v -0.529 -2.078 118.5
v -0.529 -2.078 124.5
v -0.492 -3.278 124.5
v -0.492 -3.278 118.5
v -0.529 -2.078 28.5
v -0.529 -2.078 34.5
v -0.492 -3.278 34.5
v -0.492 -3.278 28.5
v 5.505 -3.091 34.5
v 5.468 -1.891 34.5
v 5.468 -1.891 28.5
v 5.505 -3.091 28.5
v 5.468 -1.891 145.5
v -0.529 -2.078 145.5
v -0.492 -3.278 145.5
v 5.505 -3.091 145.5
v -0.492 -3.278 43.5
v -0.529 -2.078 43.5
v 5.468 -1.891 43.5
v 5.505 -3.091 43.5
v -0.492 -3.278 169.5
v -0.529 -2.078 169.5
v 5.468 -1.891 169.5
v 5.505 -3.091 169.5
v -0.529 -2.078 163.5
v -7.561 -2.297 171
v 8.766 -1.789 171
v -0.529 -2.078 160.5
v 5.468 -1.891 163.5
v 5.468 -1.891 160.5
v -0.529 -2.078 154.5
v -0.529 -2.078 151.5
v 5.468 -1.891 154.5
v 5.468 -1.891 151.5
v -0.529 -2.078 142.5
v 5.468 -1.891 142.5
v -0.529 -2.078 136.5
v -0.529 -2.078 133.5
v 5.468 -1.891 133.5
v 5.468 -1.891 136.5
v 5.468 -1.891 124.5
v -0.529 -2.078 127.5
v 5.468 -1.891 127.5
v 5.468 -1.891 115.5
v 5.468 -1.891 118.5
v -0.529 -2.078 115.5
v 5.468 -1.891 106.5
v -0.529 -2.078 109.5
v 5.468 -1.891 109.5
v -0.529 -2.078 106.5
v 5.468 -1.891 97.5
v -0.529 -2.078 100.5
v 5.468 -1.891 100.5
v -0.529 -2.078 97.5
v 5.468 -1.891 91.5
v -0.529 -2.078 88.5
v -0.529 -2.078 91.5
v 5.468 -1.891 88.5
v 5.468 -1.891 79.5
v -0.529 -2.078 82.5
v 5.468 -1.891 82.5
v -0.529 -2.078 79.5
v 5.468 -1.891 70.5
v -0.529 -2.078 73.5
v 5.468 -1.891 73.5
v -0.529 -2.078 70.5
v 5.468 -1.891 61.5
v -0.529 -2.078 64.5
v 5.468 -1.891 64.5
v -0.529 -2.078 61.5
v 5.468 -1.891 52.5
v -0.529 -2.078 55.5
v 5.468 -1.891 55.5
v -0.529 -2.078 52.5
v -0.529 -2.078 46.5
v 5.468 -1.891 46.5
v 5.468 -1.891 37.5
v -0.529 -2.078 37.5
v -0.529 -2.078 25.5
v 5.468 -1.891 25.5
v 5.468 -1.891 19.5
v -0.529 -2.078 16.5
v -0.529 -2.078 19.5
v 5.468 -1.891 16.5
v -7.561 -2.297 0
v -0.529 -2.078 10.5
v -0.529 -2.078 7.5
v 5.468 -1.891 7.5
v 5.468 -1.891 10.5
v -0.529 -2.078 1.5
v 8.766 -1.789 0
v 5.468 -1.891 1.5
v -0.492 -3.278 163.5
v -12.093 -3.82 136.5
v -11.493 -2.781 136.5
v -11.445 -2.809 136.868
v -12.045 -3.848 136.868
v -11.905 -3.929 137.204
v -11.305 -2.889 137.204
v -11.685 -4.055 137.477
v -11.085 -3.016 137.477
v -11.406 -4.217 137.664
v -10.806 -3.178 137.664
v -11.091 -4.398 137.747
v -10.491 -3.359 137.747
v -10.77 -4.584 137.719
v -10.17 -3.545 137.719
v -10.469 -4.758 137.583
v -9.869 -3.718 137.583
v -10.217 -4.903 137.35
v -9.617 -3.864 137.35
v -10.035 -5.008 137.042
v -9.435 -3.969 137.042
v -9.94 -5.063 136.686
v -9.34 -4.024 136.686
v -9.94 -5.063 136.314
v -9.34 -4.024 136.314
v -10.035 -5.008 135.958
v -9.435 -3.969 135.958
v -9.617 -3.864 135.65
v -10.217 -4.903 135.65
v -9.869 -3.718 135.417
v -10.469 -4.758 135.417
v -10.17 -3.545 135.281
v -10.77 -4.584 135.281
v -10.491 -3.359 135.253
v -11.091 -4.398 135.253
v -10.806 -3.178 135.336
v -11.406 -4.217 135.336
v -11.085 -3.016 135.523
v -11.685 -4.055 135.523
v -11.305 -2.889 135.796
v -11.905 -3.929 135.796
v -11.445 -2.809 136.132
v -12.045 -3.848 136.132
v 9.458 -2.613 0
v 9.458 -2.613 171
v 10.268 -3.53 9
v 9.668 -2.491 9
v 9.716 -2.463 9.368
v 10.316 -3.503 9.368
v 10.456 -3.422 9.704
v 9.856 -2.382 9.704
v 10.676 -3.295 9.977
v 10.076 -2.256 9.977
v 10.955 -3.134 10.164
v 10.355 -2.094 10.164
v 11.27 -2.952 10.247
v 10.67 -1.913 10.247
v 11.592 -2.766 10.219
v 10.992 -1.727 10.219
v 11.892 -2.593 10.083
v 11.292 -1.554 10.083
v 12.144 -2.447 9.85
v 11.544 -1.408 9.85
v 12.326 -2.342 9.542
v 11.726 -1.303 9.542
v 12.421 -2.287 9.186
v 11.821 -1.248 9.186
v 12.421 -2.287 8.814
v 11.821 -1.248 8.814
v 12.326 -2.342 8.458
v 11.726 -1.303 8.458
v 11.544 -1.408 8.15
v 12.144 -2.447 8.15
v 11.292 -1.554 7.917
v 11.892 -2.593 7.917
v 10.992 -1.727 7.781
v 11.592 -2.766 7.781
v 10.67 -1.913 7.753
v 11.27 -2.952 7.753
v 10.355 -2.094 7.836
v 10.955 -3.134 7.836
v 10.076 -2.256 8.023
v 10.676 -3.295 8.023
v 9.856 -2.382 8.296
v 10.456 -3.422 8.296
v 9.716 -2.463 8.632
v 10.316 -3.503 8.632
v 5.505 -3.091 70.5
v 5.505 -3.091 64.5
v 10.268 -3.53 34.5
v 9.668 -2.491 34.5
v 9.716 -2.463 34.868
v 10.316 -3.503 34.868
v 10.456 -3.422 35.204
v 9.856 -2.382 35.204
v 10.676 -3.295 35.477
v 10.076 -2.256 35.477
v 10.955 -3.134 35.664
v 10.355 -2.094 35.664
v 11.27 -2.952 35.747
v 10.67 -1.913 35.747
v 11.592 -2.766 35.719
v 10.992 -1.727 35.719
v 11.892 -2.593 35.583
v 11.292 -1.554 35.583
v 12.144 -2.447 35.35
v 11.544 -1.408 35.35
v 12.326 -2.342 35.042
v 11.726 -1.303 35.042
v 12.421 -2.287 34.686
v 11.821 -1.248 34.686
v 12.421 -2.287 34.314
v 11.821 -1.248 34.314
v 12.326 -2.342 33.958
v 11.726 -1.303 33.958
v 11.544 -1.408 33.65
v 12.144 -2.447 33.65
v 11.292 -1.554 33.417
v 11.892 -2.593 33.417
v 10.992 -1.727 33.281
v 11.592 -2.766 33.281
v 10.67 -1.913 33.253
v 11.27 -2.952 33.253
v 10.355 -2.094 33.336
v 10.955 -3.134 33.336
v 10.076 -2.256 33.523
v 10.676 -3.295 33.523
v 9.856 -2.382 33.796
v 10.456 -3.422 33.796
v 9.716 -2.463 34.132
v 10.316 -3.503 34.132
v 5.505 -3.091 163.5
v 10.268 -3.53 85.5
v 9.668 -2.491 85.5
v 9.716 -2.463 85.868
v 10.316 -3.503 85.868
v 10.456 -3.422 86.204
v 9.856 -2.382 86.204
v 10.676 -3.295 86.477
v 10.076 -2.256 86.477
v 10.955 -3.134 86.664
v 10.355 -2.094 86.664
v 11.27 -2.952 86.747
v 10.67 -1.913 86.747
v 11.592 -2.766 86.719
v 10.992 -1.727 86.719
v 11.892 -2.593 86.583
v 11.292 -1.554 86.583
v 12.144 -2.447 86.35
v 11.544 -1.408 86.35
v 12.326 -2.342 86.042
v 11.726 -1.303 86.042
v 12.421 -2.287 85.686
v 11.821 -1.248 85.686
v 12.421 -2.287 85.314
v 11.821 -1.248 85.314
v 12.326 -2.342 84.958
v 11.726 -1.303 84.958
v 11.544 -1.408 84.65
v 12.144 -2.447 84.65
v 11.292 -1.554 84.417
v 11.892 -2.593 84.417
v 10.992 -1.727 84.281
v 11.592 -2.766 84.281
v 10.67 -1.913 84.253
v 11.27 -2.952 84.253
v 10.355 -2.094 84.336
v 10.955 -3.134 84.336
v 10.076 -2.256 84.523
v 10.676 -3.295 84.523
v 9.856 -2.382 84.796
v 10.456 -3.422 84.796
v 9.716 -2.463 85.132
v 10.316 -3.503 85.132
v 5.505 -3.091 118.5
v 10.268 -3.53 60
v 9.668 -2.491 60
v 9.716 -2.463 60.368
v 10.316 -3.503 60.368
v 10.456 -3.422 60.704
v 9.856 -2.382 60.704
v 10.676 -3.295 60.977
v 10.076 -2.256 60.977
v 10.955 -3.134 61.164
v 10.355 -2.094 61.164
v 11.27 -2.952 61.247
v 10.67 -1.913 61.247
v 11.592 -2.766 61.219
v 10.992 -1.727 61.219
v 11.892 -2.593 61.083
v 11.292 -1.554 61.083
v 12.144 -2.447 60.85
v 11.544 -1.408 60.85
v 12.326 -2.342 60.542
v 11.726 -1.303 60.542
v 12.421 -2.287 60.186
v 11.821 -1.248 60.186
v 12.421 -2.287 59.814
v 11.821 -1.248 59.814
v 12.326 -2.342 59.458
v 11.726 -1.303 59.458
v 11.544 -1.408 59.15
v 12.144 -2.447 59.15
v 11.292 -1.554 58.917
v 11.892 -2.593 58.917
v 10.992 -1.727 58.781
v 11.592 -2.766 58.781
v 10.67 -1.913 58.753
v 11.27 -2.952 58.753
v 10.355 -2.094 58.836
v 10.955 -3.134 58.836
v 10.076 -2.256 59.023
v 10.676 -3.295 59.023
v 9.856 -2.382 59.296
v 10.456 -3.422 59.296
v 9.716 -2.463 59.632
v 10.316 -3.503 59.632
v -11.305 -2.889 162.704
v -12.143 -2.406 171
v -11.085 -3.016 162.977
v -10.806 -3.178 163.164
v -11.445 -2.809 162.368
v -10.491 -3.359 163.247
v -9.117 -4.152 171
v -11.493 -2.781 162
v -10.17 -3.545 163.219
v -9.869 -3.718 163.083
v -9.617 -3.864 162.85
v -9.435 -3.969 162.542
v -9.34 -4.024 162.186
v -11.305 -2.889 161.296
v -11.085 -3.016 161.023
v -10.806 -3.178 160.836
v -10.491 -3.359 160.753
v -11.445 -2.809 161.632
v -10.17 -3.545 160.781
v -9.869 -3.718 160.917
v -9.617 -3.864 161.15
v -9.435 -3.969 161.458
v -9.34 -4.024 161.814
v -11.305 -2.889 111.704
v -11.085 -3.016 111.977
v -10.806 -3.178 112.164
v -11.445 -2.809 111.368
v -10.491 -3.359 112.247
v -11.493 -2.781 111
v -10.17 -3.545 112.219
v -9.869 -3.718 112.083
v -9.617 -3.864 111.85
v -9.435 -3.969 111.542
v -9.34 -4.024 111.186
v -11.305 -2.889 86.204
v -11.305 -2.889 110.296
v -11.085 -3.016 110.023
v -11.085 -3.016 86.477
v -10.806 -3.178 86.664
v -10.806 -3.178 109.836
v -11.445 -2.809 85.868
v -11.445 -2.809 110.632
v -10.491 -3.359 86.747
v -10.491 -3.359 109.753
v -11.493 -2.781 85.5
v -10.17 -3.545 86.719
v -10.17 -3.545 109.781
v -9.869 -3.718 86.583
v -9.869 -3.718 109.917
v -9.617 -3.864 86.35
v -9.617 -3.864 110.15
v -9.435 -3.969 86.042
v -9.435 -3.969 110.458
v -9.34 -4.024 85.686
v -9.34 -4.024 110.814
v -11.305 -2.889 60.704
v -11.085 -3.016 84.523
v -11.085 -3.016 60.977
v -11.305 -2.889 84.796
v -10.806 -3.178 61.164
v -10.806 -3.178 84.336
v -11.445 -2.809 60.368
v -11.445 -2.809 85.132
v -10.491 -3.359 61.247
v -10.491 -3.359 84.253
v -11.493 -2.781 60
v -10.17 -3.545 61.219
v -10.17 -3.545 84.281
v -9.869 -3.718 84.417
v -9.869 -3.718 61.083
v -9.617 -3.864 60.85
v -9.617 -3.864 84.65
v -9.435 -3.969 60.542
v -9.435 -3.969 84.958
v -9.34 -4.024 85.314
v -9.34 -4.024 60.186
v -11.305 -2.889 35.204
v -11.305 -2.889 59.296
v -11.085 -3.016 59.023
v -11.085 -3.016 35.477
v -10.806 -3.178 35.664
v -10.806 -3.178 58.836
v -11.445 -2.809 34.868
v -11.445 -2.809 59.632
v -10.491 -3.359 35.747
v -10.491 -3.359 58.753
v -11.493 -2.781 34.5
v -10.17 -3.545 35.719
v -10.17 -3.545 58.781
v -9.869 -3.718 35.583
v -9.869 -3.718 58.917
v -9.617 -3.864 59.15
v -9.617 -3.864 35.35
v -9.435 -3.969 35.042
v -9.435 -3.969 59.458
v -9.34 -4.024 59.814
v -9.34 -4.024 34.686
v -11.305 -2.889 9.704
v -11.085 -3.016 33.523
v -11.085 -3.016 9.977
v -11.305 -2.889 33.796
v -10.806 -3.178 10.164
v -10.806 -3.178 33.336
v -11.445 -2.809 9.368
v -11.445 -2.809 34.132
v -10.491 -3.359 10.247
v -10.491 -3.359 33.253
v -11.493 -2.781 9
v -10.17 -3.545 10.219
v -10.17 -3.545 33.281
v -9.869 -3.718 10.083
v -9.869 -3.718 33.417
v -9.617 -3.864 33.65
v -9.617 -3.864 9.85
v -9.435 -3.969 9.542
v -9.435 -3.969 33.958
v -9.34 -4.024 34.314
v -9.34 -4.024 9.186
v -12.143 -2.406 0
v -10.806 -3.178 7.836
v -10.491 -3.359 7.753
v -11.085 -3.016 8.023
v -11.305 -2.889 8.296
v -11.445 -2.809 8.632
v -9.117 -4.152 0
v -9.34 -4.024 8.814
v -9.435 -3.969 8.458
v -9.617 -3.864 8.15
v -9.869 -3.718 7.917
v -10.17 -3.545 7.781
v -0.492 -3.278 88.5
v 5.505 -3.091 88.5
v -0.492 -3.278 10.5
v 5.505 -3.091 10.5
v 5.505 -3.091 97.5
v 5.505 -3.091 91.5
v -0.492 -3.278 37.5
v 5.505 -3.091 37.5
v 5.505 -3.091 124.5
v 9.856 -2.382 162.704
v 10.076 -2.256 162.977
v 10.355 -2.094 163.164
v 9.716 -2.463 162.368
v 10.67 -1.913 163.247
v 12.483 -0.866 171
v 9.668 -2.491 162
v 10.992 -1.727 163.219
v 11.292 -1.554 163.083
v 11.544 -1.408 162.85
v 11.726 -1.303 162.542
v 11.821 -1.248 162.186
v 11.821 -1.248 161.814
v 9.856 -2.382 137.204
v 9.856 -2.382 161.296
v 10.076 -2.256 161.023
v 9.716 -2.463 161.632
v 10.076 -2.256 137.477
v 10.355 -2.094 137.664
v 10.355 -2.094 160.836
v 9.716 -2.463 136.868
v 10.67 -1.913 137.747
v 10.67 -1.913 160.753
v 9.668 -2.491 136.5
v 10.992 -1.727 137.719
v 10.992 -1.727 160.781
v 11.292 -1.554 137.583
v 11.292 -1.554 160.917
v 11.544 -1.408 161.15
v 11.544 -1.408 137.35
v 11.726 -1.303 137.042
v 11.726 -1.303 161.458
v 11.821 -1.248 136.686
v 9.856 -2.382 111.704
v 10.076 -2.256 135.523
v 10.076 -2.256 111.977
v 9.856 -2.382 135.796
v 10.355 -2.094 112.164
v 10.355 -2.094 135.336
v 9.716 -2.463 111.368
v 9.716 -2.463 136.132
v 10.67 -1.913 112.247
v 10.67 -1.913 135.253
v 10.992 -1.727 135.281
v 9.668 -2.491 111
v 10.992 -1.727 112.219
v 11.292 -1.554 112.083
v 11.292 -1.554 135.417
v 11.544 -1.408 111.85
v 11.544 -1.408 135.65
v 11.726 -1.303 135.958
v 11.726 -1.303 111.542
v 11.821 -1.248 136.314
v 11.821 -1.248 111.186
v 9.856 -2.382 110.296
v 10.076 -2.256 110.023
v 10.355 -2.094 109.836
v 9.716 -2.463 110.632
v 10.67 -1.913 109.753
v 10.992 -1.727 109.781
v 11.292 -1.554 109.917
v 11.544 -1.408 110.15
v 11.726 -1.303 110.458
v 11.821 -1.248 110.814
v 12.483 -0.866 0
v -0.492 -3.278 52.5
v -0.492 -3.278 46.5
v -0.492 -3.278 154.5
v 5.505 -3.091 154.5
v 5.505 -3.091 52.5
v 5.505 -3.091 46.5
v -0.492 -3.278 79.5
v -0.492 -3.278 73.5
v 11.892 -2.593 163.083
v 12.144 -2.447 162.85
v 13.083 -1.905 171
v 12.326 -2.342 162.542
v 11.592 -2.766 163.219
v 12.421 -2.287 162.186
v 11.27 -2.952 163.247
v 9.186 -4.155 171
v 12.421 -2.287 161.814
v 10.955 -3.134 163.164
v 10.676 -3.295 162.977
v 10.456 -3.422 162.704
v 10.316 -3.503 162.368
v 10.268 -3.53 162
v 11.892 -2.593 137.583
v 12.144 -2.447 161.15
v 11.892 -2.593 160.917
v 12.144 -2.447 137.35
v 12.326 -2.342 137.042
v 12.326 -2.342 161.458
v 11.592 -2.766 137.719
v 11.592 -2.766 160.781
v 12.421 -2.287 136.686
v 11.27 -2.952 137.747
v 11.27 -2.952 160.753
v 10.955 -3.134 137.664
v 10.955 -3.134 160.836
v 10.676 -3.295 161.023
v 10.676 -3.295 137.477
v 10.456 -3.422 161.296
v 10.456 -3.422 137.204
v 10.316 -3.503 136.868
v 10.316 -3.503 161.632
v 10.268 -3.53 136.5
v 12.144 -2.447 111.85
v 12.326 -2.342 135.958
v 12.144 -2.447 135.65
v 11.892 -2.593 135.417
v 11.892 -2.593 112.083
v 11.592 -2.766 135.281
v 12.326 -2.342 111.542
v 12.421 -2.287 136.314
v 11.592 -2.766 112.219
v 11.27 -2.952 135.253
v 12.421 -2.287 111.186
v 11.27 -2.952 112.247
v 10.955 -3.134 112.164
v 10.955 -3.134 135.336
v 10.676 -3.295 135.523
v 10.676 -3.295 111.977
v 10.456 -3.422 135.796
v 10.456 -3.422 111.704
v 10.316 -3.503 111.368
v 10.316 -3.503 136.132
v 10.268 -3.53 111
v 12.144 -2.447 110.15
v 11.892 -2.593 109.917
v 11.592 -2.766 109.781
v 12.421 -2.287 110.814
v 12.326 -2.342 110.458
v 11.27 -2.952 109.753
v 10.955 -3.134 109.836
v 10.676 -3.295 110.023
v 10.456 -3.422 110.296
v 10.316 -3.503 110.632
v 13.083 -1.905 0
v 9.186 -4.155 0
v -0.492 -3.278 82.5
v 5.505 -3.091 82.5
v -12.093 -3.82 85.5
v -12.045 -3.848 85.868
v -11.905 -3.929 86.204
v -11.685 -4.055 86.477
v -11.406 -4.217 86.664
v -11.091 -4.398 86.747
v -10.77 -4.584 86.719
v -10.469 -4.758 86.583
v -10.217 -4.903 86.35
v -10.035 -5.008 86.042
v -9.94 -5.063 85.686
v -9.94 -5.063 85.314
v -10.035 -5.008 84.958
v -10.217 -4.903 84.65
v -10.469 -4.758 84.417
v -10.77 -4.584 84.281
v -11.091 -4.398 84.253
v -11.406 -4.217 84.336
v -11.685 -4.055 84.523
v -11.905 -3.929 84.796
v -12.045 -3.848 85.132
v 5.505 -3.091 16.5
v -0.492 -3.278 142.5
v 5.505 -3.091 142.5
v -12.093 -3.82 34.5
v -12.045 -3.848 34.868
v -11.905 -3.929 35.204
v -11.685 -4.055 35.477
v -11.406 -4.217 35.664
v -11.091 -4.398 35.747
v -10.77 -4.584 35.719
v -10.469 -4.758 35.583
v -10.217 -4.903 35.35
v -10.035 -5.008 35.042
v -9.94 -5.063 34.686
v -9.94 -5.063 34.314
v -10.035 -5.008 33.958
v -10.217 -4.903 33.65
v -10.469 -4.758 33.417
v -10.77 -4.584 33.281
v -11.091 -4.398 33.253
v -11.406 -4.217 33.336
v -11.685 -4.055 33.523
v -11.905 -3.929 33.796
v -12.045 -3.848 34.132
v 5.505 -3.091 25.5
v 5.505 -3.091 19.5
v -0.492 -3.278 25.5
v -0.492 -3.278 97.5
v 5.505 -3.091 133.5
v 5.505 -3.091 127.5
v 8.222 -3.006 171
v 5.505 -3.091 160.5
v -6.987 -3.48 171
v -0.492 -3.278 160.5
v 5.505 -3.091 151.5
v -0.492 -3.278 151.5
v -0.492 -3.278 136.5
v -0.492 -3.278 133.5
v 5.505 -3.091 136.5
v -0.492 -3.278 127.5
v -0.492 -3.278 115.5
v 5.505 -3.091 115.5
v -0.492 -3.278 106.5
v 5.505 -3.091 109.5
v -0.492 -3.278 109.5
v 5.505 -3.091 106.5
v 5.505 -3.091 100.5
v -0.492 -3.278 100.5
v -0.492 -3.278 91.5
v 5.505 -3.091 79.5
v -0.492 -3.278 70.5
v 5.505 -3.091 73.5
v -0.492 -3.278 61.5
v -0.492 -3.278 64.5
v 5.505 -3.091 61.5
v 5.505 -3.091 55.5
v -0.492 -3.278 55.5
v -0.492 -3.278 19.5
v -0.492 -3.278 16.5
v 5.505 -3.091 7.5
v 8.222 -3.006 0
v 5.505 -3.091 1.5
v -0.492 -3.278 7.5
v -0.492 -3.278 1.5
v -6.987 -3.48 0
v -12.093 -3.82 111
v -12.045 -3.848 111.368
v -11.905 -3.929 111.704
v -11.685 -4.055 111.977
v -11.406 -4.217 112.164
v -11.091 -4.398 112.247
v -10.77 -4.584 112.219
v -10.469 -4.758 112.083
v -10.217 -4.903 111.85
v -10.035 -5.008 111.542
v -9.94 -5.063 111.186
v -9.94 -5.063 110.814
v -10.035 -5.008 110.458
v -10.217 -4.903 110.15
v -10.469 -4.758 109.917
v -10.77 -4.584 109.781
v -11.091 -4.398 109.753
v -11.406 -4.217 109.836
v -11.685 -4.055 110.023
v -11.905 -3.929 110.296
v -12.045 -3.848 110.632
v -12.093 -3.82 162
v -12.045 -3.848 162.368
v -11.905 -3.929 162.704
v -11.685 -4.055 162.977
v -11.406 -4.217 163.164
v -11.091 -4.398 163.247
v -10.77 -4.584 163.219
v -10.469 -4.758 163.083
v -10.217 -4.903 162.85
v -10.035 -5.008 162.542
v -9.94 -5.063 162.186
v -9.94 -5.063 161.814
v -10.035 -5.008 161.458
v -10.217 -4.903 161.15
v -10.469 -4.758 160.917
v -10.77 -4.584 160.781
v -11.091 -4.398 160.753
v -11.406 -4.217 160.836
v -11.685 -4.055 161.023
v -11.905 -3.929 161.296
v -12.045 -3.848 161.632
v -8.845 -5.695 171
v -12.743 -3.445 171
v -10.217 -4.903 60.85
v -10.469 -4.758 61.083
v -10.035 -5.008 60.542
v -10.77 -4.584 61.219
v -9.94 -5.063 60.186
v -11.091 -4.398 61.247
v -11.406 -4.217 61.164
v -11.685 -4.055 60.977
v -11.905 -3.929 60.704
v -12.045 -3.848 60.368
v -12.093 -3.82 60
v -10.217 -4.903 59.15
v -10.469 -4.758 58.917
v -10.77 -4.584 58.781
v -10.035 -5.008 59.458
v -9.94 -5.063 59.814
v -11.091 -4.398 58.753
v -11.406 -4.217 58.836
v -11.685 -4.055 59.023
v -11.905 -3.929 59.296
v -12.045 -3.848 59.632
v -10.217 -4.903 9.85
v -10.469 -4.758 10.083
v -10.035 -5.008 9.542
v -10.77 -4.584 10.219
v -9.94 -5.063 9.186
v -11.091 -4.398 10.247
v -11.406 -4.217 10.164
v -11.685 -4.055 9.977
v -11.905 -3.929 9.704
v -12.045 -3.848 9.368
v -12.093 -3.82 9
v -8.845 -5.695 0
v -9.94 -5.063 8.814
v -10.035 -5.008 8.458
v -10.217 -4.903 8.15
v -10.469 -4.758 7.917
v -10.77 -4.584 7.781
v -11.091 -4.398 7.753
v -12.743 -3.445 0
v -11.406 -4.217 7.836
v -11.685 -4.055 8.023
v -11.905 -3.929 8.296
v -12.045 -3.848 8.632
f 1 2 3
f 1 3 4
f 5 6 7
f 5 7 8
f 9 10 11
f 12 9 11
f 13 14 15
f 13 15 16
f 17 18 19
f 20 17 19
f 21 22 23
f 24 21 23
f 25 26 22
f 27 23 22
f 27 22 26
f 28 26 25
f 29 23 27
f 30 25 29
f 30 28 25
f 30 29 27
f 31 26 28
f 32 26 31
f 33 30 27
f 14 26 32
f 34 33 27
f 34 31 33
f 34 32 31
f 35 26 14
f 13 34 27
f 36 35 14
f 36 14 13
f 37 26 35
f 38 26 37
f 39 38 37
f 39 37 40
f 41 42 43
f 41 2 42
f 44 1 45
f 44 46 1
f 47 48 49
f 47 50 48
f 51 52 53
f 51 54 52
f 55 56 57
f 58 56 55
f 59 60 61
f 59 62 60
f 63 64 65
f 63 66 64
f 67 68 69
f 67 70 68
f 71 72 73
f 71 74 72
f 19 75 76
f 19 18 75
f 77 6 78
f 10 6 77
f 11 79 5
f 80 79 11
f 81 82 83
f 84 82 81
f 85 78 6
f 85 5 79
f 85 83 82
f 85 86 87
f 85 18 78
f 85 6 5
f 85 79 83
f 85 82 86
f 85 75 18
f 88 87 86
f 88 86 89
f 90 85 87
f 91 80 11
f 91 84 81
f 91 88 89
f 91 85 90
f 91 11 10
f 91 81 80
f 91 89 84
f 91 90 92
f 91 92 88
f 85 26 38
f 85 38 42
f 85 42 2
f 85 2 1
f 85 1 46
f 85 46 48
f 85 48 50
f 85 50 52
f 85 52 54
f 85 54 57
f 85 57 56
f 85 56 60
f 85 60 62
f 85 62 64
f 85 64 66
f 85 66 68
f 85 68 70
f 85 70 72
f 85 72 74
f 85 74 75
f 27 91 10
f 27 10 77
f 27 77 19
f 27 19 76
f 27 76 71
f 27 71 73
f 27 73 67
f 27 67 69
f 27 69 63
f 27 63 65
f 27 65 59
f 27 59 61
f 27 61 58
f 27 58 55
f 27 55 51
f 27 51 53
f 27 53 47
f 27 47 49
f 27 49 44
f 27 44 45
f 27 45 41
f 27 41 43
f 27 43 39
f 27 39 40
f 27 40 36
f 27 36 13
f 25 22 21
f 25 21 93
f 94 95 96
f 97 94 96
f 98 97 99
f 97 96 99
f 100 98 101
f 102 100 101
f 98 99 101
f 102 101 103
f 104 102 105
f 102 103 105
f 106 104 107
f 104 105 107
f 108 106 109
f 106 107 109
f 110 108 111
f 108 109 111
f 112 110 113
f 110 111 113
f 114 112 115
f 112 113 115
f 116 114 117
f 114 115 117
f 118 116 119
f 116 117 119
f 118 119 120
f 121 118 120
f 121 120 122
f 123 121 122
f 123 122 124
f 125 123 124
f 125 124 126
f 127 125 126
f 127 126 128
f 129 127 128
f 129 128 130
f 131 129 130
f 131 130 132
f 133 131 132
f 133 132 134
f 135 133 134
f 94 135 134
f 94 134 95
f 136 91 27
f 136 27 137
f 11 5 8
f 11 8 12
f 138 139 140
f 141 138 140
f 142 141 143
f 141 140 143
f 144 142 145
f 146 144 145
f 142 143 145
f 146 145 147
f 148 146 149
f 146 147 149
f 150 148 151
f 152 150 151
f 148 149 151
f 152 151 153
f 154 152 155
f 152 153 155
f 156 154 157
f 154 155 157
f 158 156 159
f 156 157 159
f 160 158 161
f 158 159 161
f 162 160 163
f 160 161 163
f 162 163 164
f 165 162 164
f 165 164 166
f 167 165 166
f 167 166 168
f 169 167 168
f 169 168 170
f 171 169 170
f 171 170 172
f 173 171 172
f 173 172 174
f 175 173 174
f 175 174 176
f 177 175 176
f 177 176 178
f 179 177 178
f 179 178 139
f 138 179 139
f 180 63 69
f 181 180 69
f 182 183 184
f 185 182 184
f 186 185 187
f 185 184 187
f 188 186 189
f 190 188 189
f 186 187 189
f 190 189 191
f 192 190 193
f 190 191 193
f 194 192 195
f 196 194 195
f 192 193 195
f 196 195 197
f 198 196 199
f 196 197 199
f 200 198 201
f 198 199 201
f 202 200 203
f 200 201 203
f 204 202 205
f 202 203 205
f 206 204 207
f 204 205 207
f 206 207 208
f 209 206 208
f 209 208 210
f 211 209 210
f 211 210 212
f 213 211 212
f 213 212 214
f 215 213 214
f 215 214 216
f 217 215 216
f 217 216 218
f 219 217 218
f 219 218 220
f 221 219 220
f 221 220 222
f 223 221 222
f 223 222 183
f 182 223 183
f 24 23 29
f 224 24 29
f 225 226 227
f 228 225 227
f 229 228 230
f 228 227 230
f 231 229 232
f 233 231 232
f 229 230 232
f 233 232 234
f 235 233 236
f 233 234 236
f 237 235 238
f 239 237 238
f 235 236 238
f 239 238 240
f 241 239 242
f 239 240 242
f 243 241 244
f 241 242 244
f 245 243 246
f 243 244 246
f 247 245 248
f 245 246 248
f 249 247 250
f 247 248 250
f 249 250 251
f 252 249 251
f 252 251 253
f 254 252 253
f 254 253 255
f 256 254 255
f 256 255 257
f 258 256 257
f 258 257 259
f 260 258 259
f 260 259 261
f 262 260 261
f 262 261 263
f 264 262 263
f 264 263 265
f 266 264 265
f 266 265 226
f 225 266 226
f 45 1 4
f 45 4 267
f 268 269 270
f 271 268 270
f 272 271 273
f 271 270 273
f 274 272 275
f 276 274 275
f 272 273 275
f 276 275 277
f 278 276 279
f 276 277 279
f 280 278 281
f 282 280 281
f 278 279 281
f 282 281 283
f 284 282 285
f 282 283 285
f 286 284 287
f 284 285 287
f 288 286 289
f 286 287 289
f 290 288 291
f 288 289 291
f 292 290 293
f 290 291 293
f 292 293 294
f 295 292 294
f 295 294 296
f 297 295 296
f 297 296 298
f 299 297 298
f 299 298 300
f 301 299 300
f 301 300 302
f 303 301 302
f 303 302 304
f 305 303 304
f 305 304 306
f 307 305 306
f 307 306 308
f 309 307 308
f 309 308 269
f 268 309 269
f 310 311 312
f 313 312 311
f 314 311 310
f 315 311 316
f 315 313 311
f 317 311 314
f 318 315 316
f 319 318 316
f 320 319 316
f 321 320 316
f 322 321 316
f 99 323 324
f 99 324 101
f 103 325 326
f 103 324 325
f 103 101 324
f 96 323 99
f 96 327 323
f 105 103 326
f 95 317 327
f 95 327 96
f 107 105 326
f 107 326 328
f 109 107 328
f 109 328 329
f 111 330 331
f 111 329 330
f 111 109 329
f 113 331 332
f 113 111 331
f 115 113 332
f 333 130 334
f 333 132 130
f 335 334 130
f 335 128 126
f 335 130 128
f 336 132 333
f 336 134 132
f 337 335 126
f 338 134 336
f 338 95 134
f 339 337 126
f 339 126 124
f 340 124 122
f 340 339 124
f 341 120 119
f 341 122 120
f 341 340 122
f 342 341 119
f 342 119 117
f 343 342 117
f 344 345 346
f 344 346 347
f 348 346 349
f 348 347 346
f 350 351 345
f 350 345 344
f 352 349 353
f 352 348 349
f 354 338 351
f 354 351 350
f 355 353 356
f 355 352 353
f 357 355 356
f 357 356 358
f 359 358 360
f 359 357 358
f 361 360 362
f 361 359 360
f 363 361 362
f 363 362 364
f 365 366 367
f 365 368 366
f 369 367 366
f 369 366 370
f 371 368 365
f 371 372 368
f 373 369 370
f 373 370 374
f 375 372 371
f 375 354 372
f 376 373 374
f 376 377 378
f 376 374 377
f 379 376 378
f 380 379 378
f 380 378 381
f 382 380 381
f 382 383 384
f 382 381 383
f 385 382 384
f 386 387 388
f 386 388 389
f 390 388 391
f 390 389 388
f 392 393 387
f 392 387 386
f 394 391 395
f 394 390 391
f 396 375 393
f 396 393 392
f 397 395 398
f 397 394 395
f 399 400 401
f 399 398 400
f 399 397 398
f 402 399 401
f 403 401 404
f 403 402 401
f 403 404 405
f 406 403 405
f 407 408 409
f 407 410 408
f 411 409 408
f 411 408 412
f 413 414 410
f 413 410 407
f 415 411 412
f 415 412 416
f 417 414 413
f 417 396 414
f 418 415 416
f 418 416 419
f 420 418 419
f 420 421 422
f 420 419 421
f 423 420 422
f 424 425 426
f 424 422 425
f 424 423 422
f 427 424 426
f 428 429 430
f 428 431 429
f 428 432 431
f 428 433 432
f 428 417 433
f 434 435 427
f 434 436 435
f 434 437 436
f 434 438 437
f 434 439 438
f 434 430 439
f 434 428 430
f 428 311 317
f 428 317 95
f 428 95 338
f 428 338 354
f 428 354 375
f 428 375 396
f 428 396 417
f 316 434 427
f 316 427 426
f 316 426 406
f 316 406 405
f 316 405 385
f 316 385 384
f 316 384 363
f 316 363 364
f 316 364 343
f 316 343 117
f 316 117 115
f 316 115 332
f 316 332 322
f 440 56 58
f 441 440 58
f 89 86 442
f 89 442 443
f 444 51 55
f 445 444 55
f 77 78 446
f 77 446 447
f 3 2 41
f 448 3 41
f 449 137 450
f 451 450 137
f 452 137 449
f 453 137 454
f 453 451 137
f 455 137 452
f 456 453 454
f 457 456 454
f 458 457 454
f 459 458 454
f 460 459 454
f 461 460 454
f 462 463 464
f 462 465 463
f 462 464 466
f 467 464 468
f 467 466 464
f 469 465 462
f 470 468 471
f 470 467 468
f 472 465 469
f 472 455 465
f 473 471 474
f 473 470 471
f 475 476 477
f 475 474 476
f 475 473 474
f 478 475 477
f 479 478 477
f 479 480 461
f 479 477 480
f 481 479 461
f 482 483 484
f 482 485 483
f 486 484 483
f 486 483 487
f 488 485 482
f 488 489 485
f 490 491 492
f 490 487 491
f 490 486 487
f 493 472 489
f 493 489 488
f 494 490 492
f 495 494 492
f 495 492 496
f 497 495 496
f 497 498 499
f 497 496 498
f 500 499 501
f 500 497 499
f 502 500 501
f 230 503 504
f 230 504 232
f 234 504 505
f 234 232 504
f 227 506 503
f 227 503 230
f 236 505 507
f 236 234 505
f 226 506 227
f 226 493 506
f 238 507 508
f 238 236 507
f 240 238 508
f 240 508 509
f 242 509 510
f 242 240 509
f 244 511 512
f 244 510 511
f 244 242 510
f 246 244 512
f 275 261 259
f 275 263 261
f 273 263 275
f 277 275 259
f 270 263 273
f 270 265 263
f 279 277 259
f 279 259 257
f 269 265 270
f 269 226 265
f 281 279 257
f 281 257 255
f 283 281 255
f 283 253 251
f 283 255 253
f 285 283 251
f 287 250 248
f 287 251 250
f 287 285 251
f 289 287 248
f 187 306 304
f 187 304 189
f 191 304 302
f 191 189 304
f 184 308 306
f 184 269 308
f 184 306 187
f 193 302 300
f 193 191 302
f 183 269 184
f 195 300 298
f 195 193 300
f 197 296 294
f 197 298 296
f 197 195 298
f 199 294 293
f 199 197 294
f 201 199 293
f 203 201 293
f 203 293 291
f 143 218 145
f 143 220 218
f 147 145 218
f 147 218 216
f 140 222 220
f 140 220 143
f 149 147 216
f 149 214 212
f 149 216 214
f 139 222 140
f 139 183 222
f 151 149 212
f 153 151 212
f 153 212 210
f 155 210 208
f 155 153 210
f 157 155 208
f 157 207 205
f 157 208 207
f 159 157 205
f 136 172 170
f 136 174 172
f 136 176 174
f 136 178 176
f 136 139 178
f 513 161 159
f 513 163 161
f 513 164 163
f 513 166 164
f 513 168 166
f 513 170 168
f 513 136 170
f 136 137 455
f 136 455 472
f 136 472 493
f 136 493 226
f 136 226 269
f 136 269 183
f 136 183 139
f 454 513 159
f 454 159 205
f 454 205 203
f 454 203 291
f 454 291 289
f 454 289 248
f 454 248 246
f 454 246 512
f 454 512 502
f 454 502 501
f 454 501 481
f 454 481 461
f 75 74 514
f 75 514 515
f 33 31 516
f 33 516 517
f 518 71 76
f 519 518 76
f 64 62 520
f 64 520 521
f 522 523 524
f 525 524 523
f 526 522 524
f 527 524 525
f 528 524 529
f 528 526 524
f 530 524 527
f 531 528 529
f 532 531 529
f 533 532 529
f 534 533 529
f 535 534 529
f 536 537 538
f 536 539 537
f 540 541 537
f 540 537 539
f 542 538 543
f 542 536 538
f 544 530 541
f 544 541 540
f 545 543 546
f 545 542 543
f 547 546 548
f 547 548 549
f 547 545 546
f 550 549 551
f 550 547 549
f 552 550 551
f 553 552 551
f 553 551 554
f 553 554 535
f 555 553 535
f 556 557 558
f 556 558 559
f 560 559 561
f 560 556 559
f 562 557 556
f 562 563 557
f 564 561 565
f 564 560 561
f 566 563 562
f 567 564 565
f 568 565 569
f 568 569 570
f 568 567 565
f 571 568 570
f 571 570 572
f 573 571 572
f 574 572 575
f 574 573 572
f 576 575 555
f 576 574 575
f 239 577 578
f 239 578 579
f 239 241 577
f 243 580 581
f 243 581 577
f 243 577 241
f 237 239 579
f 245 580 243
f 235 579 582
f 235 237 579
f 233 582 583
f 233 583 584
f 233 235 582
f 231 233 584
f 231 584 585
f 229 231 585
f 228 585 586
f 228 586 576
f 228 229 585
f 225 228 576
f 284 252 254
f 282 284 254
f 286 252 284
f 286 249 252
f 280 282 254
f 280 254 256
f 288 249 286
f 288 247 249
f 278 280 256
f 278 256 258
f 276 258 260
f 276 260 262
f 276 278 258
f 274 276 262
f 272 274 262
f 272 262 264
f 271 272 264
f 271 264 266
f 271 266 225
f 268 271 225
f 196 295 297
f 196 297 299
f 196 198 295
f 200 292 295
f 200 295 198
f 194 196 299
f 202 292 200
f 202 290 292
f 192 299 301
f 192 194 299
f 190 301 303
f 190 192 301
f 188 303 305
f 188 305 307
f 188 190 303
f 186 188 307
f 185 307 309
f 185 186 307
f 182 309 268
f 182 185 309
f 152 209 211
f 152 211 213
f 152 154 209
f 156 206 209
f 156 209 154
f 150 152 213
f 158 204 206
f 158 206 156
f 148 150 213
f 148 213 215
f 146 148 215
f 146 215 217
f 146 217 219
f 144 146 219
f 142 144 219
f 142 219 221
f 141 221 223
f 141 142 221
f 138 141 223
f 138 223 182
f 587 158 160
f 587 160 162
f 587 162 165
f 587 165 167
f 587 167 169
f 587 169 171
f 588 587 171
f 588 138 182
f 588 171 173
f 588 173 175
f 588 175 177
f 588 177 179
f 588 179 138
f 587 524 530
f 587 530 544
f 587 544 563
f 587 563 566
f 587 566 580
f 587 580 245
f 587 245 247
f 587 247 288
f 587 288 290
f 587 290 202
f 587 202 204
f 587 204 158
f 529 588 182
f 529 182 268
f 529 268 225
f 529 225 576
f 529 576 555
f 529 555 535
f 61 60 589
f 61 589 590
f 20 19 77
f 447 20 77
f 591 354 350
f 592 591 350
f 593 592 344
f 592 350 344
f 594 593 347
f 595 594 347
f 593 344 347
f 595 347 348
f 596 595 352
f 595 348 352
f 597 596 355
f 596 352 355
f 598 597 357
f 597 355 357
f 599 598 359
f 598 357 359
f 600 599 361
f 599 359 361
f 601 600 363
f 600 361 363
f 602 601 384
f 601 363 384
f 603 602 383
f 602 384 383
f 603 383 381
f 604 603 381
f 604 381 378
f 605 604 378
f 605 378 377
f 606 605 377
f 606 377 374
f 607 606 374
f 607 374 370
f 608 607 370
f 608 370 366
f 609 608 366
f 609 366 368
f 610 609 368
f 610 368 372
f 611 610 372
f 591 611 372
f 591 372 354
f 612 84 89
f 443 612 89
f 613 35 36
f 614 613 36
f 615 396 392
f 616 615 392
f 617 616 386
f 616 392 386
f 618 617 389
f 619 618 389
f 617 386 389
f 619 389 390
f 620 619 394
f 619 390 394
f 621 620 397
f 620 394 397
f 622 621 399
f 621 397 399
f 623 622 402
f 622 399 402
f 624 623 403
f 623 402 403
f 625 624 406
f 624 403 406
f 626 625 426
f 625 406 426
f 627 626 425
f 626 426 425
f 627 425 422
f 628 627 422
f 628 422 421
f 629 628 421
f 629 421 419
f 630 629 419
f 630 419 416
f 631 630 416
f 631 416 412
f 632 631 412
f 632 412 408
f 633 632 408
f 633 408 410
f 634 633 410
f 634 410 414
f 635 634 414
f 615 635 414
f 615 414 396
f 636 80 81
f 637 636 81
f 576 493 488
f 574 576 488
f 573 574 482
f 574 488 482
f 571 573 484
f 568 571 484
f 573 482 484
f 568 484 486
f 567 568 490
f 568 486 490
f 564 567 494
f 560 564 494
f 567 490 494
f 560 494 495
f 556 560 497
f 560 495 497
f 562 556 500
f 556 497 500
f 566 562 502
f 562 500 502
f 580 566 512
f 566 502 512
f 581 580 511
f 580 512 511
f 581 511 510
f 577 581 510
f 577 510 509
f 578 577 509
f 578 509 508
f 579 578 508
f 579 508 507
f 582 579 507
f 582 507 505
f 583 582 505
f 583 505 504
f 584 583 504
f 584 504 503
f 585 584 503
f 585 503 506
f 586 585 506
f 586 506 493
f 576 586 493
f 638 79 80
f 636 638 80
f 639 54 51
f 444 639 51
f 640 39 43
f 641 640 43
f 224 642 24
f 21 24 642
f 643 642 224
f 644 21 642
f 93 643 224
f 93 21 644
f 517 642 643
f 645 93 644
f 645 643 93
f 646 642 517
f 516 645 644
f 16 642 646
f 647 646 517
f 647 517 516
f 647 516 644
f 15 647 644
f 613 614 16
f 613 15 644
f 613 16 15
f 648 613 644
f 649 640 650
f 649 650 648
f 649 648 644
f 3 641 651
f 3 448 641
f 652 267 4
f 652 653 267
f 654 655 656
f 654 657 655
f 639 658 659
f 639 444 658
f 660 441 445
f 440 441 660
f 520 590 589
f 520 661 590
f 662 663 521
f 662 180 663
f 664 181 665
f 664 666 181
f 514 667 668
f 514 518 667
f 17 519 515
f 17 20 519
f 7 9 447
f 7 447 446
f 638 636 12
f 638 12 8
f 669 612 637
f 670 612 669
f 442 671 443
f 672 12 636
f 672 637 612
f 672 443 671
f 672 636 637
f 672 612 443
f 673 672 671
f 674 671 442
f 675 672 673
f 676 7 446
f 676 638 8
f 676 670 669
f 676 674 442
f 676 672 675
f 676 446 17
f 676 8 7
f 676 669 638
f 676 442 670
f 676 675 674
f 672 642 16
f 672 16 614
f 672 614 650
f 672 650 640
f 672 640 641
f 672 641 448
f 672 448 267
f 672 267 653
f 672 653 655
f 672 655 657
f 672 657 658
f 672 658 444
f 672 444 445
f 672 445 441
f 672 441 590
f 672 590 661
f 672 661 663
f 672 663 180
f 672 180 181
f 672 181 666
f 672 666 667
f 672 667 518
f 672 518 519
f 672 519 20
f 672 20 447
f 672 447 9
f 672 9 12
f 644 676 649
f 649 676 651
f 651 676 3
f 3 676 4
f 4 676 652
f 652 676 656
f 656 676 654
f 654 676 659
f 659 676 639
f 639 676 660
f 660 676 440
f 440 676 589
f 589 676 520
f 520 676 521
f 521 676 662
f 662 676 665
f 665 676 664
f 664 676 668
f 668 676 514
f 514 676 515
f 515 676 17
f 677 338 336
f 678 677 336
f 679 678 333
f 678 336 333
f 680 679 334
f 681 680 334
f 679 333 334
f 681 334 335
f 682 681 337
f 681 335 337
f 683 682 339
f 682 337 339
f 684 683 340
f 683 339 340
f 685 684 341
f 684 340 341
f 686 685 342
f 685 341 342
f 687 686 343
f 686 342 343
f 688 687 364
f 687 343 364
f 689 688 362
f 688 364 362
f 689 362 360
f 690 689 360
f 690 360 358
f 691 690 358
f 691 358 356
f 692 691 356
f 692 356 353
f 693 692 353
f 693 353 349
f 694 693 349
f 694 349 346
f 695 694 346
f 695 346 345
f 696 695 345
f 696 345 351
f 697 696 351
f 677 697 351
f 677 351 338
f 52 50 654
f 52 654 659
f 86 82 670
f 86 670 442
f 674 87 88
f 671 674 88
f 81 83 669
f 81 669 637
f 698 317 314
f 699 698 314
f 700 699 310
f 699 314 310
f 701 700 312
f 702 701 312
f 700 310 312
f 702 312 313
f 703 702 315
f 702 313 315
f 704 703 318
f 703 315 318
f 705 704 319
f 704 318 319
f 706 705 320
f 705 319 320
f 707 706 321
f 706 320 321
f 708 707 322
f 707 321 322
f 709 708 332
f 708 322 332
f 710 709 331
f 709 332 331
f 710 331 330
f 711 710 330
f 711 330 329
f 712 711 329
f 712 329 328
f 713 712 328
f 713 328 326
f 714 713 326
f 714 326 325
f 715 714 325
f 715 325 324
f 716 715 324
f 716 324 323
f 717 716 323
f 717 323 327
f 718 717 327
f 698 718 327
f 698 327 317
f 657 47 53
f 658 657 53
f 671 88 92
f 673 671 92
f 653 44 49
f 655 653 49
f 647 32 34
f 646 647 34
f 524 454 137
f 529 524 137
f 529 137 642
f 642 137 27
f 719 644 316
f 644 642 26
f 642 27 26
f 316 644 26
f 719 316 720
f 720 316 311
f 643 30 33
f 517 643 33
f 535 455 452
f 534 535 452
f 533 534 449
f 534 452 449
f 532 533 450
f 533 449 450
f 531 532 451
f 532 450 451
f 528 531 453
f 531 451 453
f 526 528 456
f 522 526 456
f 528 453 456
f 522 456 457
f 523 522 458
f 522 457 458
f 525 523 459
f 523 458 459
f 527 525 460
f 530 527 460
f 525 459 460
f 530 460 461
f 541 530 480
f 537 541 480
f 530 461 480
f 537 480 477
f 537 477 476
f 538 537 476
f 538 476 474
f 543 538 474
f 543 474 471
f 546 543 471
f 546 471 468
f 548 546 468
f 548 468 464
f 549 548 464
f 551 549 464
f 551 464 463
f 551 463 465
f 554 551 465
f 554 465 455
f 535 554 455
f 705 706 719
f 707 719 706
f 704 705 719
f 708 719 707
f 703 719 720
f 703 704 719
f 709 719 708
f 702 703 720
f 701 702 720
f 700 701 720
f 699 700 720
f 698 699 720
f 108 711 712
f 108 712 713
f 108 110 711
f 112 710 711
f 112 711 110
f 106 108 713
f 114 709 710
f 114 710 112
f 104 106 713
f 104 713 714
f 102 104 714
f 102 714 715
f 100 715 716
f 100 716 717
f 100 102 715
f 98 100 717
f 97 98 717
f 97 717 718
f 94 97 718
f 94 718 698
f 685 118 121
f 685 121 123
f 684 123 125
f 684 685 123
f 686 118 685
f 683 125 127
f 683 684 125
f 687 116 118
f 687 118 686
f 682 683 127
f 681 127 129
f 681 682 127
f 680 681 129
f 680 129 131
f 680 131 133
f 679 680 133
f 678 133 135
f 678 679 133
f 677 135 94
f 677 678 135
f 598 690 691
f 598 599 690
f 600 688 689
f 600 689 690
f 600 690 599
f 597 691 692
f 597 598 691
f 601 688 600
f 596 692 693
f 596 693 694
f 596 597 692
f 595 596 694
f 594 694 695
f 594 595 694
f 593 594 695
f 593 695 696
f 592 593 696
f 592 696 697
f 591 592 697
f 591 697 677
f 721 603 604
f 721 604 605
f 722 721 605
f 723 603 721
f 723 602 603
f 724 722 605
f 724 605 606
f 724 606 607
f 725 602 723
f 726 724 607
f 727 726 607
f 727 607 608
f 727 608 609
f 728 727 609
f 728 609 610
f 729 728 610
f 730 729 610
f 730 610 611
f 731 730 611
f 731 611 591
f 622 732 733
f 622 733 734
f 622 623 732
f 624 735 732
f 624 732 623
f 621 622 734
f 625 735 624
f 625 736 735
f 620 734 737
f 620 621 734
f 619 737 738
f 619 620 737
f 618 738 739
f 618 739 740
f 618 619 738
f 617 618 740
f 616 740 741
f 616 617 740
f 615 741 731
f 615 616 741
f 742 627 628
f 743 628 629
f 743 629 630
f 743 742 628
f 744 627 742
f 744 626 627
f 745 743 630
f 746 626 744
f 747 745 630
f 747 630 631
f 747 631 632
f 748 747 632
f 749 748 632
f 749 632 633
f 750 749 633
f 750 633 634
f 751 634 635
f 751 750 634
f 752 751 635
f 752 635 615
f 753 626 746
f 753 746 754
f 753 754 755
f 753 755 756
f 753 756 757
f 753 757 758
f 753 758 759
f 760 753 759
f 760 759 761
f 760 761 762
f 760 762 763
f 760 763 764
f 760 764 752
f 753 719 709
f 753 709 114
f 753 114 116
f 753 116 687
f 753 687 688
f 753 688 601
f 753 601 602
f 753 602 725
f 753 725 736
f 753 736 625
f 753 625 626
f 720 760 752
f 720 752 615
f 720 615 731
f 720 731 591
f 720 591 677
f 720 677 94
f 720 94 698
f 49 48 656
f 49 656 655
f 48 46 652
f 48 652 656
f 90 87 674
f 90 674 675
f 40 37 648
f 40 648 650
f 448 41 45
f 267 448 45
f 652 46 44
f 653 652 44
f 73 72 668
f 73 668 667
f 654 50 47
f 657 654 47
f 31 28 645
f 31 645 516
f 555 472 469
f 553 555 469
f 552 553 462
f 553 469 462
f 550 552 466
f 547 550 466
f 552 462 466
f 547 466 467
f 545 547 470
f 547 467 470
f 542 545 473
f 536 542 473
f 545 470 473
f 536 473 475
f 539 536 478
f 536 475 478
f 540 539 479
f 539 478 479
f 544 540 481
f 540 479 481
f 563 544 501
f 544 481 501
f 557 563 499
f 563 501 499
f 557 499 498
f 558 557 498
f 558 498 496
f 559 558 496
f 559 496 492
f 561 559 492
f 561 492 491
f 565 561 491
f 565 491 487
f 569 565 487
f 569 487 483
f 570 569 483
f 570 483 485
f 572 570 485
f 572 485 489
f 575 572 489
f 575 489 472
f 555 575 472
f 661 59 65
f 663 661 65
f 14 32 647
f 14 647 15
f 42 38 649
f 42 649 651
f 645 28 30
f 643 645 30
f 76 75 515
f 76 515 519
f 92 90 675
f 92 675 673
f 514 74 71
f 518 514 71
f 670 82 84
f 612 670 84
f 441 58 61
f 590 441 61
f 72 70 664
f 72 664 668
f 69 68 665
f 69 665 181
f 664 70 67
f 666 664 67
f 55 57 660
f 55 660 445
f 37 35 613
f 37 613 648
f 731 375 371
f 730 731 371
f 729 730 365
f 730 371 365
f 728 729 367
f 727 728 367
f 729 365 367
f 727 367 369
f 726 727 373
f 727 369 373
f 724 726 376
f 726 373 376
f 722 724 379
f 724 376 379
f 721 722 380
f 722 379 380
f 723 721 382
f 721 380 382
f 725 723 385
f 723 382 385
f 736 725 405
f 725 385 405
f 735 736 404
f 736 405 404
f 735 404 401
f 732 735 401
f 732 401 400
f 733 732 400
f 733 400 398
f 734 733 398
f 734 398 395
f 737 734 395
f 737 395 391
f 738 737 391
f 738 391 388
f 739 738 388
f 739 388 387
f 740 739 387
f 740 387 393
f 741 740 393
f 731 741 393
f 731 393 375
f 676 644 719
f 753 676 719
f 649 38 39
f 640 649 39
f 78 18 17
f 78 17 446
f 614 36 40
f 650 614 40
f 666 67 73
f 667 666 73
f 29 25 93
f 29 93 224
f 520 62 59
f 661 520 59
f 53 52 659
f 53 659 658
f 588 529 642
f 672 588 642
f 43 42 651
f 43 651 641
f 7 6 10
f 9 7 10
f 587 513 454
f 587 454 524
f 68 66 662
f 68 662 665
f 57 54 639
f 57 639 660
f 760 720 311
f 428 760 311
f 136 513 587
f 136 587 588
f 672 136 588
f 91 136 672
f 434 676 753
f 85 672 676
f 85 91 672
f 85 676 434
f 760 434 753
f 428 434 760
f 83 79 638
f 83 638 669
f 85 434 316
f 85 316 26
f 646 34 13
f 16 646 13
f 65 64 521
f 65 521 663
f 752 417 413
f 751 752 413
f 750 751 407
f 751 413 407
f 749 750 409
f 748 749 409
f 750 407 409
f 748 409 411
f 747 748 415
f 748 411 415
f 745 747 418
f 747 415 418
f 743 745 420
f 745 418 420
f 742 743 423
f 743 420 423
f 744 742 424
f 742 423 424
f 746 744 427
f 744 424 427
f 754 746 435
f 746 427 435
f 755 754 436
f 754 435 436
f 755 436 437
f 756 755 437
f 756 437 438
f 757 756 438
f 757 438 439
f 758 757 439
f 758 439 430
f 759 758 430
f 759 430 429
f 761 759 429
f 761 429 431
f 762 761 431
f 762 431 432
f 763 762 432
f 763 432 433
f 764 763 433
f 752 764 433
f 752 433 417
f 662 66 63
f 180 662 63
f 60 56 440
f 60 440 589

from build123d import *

# Parameters (mm, degrees)
BOSS_EXTRUDE1_DEPTH = 171
SKETCH2_R           = 1.25
CUT_EXTRUDE1_DEPTH  = 10
SKETCH4_R           = 1.25
CUT_EXTRUDE2_DEPTH  = 10
LPATTERN1_COUNT     = 7
LPATTERN1_PITCH     = 25.5
SKETCH5_W           = 6
SKETCH5_H           = 6
CUT_EXTRUDE3_DEPTH  = 10
LPATTERN2_COUNT     = 19
LPATTERN2_PITCH     = 9


with BuildPart() as part:
    # Sketch1 → Boss-Extrude1 (new body)
    with BuildSketch(Plane.XY):
        Polygon((-7.560747901, -2.297203345), (8.76644945, -1.788652997), (9.457807768, -2.612581756), (12.482904169, -0.866041535), (13.082904169, -1.905272019), (9.185789852, -4.155272019), (8.221608437, -3.006205355), (-6.986662858, -3.479904024), (-8.845450789, -5.695121219), (-12.742565106, -3.445121219), (-12.142565106, -2.405890734), (-9.117468705, -4.152430955), align=None)
    extrude(amount=BOSS_EXTRUDE1_DEPTH)

    # Sketch2 → Cut-Extrude1 (cut)
    with BuildSketch(Plane(origin=(3.495733027, -6.054787213, 0), x_dir=(0.8660254037844403, 0.49999999999999734, 0), z_dir=(-0.49999999999999734, 0.8660254037844403, 0))):
        with Locations(Location((8.377491356, -162, 0), (0, 0, 180))):
            Circle(SKETCH2_R)
    cut_extrude1 = extrude(amount=-CUT_EXTRUDE1_DEPTH, mode=Mode.SUBTRACT)

    # Sketch4 → Cut-Extrude2 (cut)
    with BuildSketch(Plane(origin=(-4.077422524, -7.062302975, 0), x_dir=(0.8660254037844392, -0.49999999999999917, 0), z_dir=(0.49999999999999917, 0.8660254037844392, 0))):
        with Locations(Location((-7.312824482, -162, 0), (0, 0, 180))):
            Circle(SKETCH4_R)
    cut_extrude2 = extrude(amount=-CUT_EXTRUDE2_DEPTH, mode=Mode.SUBTRACT)

    # LPattern1: Cut-Extrude1, Cut-Extrude2 ×7
    with Locations(*[(0, 0, -i * LPATTERN1_PITCH) for i in range(1, LPATTERN1_COUNT)]):
        add(cut_extrude1, mode=Mode.SUBTRACT)
        add(cut_extrude2, mode=Mode.SUBTRACT)

    # Sketch5 → Cut-Extrude3 (cut)
    with BuildSketch(Plane(origin=(0.064154599, -2.059707176, 0), x_dir=(0.9995152712604761, 0.031132338766899612, 0), z_dir=(-0.031132338766899612, 0.9995152712604761, 0))):
        with Locations((2.406515149, -166.5)):
            Rectangle(SKETCH5_W, SKETCH5_H)
    cut_extrude3 = extrude(amount=-CUT_EXTRUDE3_DEPTH, mode=Mode.SUBTRACT)

    # LPattern2: Cut-Extrude3 ×19
    with Locations(*[(0, 0, -i * LPATTERN2_PITCH) for i in range(1, LPATTERN2_COUNT)]):
        add(cut_extrude3, mode=Mode.SUBTRACT)


solid = part.part
